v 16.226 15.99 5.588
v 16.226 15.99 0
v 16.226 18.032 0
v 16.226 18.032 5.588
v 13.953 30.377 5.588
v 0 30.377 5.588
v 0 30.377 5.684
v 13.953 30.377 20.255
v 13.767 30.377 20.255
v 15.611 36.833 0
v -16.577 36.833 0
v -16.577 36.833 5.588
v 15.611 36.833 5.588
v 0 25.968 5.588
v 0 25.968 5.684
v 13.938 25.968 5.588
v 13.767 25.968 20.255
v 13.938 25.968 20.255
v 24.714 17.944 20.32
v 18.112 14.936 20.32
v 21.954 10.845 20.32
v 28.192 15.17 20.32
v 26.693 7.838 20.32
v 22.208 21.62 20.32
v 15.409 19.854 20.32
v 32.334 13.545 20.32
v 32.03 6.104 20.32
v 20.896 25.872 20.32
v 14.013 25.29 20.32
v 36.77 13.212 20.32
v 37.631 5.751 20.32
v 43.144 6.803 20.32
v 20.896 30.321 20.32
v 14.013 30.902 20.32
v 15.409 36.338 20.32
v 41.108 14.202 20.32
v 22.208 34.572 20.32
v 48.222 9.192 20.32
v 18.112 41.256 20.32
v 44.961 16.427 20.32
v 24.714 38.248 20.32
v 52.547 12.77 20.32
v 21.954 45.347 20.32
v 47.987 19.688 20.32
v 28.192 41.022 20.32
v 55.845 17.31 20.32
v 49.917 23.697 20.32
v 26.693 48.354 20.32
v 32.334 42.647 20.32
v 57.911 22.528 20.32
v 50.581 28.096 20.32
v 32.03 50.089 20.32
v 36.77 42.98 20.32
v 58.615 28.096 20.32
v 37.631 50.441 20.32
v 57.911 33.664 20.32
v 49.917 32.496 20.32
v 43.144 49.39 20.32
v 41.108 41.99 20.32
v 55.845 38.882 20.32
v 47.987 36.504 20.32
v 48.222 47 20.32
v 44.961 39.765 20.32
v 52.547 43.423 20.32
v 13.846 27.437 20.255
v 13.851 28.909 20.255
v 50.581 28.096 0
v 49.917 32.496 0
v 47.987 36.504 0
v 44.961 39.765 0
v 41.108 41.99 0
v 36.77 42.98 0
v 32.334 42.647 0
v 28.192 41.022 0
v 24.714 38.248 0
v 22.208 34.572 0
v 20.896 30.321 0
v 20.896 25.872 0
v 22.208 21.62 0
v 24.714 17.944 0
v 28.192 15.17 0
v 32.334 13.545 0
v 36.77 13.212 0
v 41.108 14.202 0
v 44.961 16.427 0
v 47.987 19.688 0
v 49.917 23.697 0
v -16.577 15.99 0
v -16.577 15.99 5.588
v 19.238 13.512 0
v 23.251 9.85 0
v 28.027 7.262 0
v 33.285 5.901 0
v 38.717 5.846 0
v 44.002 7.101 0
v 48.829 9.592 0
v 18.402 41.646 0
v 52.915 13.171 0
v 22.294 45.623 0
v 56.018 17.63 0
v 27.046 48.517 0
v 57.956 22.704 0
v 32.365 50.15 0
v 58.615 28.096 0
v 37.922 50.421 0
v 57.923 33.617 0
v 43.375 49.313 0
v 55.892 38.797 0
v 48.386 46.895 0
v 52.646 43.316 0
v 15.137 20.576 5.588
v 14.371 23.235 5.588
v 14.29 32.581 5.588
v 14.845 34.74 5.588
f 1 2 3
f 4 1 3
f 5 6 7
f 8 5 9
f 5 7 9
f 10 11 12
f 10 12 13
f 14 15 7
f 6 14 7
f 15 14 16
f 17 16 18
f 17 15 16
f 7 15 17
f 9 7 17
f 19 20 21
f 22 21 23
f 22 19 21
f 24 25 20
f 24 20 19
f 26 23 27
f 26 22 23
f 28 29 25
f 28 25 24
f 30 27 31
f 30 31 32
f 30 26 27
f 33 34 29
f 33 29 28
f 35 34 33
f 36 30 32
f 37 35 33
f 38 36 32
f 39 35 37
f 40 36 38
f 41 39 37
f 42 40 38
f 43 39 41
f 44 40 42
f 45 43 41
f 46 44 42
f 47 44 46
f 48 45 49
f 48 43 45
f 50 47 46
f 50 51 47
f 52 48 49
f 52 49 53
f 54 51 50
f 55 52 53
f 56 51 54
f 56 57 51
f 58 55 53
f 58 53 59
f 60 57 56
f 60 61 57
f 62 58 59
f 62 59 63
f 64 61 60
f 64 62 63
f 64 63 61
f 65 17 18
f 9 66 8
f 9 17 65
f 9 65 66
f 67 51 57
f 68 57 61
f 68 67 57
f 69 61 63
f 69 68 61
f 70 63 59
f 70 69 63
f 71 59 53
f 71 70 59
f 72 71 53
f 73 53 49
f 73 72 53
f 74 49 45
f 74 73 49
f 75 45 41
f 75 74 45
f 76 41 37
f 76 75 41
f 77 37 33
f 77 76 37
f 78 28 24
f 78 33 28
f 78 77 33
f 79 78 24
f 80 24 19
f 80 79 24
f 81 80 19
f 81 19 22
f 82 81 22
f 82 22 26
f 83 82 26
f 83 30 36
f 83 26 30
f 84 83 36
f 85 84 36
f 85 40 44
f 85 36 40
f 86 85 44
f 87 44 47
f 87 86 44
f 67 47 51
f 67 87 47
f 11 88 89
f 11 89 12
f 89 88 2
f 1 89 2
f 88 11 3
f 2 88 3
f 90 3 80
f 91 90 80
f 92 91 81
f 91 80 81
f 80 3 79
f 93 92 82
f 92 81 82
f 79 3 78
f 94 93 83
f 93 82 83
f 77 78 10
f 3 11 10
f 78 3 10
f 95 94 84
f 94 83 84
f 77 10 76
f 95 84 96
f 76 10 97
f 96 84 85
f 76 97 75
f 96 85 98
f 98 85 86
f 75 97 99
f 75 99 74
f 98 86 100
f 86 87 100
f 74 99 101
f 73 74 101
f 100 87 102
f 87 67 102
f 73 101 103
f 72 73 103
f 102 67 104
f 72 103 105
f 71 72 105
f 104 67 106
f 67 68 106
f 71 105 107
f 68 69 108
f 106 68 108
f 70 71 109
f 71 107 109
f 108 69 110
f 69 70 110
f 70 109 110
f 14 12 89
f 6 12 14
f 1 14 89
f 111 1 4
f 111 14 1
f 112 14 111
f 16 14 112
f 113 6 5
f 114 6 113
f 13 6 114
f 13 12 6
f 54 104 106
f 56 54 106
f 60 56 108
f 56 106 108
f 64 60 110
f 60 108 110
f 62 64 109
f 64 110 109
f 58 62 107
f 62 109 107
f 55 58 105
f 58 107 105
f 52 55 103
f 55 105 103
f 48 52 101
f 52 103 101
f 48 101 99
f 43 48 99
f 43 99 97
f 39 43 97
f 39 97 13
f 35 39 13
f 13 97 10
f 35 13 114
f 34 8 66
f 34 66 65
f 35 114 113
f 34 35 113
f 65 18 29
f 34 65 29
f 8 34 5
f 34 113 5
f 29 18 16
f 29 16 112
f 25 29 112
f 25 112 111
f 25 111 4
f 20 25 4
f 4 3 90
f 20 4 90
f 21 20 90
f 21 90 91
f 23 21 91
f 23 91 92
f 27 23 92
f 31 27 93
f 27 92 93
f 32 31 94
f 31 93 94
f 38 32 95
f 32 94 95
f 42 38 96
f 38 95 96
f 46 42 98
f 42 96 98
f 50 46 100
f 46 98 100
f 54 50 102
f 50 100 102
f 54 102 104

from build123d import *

# Parameters (mm, degrees)
F0_R     = 22.389121
F1_DEPTH = 20.32
F2_R     = 14.925471
F3_DEPTH = 20.321
F4_W     = 32.802565
F4_H     = 20.843296
F5_DEPTH = 5.588
F6_W     = 4.409732
F6_H     = 14.755644
F7_DEPTH = 16.764
F9_DEPTH = 50.486326


with BuildPart() as f1:
    # F0 (on Top) → F1 (new body)
    with BuildSketch(Plane.XY):
        with Locations((36.225565, 28.096205)):
            Circle(F0_R)
    extrude(amount=F1_DEPTH)

    # F2 (on Top) → F3 (cut, through all)
    with BuildSketch(Plane.XY):
        with Locations((35.655081, 28.096205)):
            Circle(F2_R)
    extrude(amount=F3_DEPTH, mode=Mode.SUBTRACT)

    # F4 (on Top) → F5 (join)
    with BuildSketch(Plane.XY):
        with Locations((-0.175342, 26.411418)):
            Rectangle(F4_W, F4_H)
    extrude(amount=F5_DEPTH)

    # F6 (on Right) → F7 (join)
    with BuildSketch(Plane.YZ):
        with Locations((28.172397, 12.87685)):
            Rectangle(F6_W, F6_H)
    extrude(amount=F7_DEPTH)

    # F8 (on Front) → F9 (cut, through all)
    with BuildSketch(Plane.XZ):
        Polygon((0, 5.684014), (13.850843, 20.343132), (0, 20.852523), align=None)
    extrude(amount=-F9_DEPTH, mode=Mode.SUBTRACT)


solid = f1.part
